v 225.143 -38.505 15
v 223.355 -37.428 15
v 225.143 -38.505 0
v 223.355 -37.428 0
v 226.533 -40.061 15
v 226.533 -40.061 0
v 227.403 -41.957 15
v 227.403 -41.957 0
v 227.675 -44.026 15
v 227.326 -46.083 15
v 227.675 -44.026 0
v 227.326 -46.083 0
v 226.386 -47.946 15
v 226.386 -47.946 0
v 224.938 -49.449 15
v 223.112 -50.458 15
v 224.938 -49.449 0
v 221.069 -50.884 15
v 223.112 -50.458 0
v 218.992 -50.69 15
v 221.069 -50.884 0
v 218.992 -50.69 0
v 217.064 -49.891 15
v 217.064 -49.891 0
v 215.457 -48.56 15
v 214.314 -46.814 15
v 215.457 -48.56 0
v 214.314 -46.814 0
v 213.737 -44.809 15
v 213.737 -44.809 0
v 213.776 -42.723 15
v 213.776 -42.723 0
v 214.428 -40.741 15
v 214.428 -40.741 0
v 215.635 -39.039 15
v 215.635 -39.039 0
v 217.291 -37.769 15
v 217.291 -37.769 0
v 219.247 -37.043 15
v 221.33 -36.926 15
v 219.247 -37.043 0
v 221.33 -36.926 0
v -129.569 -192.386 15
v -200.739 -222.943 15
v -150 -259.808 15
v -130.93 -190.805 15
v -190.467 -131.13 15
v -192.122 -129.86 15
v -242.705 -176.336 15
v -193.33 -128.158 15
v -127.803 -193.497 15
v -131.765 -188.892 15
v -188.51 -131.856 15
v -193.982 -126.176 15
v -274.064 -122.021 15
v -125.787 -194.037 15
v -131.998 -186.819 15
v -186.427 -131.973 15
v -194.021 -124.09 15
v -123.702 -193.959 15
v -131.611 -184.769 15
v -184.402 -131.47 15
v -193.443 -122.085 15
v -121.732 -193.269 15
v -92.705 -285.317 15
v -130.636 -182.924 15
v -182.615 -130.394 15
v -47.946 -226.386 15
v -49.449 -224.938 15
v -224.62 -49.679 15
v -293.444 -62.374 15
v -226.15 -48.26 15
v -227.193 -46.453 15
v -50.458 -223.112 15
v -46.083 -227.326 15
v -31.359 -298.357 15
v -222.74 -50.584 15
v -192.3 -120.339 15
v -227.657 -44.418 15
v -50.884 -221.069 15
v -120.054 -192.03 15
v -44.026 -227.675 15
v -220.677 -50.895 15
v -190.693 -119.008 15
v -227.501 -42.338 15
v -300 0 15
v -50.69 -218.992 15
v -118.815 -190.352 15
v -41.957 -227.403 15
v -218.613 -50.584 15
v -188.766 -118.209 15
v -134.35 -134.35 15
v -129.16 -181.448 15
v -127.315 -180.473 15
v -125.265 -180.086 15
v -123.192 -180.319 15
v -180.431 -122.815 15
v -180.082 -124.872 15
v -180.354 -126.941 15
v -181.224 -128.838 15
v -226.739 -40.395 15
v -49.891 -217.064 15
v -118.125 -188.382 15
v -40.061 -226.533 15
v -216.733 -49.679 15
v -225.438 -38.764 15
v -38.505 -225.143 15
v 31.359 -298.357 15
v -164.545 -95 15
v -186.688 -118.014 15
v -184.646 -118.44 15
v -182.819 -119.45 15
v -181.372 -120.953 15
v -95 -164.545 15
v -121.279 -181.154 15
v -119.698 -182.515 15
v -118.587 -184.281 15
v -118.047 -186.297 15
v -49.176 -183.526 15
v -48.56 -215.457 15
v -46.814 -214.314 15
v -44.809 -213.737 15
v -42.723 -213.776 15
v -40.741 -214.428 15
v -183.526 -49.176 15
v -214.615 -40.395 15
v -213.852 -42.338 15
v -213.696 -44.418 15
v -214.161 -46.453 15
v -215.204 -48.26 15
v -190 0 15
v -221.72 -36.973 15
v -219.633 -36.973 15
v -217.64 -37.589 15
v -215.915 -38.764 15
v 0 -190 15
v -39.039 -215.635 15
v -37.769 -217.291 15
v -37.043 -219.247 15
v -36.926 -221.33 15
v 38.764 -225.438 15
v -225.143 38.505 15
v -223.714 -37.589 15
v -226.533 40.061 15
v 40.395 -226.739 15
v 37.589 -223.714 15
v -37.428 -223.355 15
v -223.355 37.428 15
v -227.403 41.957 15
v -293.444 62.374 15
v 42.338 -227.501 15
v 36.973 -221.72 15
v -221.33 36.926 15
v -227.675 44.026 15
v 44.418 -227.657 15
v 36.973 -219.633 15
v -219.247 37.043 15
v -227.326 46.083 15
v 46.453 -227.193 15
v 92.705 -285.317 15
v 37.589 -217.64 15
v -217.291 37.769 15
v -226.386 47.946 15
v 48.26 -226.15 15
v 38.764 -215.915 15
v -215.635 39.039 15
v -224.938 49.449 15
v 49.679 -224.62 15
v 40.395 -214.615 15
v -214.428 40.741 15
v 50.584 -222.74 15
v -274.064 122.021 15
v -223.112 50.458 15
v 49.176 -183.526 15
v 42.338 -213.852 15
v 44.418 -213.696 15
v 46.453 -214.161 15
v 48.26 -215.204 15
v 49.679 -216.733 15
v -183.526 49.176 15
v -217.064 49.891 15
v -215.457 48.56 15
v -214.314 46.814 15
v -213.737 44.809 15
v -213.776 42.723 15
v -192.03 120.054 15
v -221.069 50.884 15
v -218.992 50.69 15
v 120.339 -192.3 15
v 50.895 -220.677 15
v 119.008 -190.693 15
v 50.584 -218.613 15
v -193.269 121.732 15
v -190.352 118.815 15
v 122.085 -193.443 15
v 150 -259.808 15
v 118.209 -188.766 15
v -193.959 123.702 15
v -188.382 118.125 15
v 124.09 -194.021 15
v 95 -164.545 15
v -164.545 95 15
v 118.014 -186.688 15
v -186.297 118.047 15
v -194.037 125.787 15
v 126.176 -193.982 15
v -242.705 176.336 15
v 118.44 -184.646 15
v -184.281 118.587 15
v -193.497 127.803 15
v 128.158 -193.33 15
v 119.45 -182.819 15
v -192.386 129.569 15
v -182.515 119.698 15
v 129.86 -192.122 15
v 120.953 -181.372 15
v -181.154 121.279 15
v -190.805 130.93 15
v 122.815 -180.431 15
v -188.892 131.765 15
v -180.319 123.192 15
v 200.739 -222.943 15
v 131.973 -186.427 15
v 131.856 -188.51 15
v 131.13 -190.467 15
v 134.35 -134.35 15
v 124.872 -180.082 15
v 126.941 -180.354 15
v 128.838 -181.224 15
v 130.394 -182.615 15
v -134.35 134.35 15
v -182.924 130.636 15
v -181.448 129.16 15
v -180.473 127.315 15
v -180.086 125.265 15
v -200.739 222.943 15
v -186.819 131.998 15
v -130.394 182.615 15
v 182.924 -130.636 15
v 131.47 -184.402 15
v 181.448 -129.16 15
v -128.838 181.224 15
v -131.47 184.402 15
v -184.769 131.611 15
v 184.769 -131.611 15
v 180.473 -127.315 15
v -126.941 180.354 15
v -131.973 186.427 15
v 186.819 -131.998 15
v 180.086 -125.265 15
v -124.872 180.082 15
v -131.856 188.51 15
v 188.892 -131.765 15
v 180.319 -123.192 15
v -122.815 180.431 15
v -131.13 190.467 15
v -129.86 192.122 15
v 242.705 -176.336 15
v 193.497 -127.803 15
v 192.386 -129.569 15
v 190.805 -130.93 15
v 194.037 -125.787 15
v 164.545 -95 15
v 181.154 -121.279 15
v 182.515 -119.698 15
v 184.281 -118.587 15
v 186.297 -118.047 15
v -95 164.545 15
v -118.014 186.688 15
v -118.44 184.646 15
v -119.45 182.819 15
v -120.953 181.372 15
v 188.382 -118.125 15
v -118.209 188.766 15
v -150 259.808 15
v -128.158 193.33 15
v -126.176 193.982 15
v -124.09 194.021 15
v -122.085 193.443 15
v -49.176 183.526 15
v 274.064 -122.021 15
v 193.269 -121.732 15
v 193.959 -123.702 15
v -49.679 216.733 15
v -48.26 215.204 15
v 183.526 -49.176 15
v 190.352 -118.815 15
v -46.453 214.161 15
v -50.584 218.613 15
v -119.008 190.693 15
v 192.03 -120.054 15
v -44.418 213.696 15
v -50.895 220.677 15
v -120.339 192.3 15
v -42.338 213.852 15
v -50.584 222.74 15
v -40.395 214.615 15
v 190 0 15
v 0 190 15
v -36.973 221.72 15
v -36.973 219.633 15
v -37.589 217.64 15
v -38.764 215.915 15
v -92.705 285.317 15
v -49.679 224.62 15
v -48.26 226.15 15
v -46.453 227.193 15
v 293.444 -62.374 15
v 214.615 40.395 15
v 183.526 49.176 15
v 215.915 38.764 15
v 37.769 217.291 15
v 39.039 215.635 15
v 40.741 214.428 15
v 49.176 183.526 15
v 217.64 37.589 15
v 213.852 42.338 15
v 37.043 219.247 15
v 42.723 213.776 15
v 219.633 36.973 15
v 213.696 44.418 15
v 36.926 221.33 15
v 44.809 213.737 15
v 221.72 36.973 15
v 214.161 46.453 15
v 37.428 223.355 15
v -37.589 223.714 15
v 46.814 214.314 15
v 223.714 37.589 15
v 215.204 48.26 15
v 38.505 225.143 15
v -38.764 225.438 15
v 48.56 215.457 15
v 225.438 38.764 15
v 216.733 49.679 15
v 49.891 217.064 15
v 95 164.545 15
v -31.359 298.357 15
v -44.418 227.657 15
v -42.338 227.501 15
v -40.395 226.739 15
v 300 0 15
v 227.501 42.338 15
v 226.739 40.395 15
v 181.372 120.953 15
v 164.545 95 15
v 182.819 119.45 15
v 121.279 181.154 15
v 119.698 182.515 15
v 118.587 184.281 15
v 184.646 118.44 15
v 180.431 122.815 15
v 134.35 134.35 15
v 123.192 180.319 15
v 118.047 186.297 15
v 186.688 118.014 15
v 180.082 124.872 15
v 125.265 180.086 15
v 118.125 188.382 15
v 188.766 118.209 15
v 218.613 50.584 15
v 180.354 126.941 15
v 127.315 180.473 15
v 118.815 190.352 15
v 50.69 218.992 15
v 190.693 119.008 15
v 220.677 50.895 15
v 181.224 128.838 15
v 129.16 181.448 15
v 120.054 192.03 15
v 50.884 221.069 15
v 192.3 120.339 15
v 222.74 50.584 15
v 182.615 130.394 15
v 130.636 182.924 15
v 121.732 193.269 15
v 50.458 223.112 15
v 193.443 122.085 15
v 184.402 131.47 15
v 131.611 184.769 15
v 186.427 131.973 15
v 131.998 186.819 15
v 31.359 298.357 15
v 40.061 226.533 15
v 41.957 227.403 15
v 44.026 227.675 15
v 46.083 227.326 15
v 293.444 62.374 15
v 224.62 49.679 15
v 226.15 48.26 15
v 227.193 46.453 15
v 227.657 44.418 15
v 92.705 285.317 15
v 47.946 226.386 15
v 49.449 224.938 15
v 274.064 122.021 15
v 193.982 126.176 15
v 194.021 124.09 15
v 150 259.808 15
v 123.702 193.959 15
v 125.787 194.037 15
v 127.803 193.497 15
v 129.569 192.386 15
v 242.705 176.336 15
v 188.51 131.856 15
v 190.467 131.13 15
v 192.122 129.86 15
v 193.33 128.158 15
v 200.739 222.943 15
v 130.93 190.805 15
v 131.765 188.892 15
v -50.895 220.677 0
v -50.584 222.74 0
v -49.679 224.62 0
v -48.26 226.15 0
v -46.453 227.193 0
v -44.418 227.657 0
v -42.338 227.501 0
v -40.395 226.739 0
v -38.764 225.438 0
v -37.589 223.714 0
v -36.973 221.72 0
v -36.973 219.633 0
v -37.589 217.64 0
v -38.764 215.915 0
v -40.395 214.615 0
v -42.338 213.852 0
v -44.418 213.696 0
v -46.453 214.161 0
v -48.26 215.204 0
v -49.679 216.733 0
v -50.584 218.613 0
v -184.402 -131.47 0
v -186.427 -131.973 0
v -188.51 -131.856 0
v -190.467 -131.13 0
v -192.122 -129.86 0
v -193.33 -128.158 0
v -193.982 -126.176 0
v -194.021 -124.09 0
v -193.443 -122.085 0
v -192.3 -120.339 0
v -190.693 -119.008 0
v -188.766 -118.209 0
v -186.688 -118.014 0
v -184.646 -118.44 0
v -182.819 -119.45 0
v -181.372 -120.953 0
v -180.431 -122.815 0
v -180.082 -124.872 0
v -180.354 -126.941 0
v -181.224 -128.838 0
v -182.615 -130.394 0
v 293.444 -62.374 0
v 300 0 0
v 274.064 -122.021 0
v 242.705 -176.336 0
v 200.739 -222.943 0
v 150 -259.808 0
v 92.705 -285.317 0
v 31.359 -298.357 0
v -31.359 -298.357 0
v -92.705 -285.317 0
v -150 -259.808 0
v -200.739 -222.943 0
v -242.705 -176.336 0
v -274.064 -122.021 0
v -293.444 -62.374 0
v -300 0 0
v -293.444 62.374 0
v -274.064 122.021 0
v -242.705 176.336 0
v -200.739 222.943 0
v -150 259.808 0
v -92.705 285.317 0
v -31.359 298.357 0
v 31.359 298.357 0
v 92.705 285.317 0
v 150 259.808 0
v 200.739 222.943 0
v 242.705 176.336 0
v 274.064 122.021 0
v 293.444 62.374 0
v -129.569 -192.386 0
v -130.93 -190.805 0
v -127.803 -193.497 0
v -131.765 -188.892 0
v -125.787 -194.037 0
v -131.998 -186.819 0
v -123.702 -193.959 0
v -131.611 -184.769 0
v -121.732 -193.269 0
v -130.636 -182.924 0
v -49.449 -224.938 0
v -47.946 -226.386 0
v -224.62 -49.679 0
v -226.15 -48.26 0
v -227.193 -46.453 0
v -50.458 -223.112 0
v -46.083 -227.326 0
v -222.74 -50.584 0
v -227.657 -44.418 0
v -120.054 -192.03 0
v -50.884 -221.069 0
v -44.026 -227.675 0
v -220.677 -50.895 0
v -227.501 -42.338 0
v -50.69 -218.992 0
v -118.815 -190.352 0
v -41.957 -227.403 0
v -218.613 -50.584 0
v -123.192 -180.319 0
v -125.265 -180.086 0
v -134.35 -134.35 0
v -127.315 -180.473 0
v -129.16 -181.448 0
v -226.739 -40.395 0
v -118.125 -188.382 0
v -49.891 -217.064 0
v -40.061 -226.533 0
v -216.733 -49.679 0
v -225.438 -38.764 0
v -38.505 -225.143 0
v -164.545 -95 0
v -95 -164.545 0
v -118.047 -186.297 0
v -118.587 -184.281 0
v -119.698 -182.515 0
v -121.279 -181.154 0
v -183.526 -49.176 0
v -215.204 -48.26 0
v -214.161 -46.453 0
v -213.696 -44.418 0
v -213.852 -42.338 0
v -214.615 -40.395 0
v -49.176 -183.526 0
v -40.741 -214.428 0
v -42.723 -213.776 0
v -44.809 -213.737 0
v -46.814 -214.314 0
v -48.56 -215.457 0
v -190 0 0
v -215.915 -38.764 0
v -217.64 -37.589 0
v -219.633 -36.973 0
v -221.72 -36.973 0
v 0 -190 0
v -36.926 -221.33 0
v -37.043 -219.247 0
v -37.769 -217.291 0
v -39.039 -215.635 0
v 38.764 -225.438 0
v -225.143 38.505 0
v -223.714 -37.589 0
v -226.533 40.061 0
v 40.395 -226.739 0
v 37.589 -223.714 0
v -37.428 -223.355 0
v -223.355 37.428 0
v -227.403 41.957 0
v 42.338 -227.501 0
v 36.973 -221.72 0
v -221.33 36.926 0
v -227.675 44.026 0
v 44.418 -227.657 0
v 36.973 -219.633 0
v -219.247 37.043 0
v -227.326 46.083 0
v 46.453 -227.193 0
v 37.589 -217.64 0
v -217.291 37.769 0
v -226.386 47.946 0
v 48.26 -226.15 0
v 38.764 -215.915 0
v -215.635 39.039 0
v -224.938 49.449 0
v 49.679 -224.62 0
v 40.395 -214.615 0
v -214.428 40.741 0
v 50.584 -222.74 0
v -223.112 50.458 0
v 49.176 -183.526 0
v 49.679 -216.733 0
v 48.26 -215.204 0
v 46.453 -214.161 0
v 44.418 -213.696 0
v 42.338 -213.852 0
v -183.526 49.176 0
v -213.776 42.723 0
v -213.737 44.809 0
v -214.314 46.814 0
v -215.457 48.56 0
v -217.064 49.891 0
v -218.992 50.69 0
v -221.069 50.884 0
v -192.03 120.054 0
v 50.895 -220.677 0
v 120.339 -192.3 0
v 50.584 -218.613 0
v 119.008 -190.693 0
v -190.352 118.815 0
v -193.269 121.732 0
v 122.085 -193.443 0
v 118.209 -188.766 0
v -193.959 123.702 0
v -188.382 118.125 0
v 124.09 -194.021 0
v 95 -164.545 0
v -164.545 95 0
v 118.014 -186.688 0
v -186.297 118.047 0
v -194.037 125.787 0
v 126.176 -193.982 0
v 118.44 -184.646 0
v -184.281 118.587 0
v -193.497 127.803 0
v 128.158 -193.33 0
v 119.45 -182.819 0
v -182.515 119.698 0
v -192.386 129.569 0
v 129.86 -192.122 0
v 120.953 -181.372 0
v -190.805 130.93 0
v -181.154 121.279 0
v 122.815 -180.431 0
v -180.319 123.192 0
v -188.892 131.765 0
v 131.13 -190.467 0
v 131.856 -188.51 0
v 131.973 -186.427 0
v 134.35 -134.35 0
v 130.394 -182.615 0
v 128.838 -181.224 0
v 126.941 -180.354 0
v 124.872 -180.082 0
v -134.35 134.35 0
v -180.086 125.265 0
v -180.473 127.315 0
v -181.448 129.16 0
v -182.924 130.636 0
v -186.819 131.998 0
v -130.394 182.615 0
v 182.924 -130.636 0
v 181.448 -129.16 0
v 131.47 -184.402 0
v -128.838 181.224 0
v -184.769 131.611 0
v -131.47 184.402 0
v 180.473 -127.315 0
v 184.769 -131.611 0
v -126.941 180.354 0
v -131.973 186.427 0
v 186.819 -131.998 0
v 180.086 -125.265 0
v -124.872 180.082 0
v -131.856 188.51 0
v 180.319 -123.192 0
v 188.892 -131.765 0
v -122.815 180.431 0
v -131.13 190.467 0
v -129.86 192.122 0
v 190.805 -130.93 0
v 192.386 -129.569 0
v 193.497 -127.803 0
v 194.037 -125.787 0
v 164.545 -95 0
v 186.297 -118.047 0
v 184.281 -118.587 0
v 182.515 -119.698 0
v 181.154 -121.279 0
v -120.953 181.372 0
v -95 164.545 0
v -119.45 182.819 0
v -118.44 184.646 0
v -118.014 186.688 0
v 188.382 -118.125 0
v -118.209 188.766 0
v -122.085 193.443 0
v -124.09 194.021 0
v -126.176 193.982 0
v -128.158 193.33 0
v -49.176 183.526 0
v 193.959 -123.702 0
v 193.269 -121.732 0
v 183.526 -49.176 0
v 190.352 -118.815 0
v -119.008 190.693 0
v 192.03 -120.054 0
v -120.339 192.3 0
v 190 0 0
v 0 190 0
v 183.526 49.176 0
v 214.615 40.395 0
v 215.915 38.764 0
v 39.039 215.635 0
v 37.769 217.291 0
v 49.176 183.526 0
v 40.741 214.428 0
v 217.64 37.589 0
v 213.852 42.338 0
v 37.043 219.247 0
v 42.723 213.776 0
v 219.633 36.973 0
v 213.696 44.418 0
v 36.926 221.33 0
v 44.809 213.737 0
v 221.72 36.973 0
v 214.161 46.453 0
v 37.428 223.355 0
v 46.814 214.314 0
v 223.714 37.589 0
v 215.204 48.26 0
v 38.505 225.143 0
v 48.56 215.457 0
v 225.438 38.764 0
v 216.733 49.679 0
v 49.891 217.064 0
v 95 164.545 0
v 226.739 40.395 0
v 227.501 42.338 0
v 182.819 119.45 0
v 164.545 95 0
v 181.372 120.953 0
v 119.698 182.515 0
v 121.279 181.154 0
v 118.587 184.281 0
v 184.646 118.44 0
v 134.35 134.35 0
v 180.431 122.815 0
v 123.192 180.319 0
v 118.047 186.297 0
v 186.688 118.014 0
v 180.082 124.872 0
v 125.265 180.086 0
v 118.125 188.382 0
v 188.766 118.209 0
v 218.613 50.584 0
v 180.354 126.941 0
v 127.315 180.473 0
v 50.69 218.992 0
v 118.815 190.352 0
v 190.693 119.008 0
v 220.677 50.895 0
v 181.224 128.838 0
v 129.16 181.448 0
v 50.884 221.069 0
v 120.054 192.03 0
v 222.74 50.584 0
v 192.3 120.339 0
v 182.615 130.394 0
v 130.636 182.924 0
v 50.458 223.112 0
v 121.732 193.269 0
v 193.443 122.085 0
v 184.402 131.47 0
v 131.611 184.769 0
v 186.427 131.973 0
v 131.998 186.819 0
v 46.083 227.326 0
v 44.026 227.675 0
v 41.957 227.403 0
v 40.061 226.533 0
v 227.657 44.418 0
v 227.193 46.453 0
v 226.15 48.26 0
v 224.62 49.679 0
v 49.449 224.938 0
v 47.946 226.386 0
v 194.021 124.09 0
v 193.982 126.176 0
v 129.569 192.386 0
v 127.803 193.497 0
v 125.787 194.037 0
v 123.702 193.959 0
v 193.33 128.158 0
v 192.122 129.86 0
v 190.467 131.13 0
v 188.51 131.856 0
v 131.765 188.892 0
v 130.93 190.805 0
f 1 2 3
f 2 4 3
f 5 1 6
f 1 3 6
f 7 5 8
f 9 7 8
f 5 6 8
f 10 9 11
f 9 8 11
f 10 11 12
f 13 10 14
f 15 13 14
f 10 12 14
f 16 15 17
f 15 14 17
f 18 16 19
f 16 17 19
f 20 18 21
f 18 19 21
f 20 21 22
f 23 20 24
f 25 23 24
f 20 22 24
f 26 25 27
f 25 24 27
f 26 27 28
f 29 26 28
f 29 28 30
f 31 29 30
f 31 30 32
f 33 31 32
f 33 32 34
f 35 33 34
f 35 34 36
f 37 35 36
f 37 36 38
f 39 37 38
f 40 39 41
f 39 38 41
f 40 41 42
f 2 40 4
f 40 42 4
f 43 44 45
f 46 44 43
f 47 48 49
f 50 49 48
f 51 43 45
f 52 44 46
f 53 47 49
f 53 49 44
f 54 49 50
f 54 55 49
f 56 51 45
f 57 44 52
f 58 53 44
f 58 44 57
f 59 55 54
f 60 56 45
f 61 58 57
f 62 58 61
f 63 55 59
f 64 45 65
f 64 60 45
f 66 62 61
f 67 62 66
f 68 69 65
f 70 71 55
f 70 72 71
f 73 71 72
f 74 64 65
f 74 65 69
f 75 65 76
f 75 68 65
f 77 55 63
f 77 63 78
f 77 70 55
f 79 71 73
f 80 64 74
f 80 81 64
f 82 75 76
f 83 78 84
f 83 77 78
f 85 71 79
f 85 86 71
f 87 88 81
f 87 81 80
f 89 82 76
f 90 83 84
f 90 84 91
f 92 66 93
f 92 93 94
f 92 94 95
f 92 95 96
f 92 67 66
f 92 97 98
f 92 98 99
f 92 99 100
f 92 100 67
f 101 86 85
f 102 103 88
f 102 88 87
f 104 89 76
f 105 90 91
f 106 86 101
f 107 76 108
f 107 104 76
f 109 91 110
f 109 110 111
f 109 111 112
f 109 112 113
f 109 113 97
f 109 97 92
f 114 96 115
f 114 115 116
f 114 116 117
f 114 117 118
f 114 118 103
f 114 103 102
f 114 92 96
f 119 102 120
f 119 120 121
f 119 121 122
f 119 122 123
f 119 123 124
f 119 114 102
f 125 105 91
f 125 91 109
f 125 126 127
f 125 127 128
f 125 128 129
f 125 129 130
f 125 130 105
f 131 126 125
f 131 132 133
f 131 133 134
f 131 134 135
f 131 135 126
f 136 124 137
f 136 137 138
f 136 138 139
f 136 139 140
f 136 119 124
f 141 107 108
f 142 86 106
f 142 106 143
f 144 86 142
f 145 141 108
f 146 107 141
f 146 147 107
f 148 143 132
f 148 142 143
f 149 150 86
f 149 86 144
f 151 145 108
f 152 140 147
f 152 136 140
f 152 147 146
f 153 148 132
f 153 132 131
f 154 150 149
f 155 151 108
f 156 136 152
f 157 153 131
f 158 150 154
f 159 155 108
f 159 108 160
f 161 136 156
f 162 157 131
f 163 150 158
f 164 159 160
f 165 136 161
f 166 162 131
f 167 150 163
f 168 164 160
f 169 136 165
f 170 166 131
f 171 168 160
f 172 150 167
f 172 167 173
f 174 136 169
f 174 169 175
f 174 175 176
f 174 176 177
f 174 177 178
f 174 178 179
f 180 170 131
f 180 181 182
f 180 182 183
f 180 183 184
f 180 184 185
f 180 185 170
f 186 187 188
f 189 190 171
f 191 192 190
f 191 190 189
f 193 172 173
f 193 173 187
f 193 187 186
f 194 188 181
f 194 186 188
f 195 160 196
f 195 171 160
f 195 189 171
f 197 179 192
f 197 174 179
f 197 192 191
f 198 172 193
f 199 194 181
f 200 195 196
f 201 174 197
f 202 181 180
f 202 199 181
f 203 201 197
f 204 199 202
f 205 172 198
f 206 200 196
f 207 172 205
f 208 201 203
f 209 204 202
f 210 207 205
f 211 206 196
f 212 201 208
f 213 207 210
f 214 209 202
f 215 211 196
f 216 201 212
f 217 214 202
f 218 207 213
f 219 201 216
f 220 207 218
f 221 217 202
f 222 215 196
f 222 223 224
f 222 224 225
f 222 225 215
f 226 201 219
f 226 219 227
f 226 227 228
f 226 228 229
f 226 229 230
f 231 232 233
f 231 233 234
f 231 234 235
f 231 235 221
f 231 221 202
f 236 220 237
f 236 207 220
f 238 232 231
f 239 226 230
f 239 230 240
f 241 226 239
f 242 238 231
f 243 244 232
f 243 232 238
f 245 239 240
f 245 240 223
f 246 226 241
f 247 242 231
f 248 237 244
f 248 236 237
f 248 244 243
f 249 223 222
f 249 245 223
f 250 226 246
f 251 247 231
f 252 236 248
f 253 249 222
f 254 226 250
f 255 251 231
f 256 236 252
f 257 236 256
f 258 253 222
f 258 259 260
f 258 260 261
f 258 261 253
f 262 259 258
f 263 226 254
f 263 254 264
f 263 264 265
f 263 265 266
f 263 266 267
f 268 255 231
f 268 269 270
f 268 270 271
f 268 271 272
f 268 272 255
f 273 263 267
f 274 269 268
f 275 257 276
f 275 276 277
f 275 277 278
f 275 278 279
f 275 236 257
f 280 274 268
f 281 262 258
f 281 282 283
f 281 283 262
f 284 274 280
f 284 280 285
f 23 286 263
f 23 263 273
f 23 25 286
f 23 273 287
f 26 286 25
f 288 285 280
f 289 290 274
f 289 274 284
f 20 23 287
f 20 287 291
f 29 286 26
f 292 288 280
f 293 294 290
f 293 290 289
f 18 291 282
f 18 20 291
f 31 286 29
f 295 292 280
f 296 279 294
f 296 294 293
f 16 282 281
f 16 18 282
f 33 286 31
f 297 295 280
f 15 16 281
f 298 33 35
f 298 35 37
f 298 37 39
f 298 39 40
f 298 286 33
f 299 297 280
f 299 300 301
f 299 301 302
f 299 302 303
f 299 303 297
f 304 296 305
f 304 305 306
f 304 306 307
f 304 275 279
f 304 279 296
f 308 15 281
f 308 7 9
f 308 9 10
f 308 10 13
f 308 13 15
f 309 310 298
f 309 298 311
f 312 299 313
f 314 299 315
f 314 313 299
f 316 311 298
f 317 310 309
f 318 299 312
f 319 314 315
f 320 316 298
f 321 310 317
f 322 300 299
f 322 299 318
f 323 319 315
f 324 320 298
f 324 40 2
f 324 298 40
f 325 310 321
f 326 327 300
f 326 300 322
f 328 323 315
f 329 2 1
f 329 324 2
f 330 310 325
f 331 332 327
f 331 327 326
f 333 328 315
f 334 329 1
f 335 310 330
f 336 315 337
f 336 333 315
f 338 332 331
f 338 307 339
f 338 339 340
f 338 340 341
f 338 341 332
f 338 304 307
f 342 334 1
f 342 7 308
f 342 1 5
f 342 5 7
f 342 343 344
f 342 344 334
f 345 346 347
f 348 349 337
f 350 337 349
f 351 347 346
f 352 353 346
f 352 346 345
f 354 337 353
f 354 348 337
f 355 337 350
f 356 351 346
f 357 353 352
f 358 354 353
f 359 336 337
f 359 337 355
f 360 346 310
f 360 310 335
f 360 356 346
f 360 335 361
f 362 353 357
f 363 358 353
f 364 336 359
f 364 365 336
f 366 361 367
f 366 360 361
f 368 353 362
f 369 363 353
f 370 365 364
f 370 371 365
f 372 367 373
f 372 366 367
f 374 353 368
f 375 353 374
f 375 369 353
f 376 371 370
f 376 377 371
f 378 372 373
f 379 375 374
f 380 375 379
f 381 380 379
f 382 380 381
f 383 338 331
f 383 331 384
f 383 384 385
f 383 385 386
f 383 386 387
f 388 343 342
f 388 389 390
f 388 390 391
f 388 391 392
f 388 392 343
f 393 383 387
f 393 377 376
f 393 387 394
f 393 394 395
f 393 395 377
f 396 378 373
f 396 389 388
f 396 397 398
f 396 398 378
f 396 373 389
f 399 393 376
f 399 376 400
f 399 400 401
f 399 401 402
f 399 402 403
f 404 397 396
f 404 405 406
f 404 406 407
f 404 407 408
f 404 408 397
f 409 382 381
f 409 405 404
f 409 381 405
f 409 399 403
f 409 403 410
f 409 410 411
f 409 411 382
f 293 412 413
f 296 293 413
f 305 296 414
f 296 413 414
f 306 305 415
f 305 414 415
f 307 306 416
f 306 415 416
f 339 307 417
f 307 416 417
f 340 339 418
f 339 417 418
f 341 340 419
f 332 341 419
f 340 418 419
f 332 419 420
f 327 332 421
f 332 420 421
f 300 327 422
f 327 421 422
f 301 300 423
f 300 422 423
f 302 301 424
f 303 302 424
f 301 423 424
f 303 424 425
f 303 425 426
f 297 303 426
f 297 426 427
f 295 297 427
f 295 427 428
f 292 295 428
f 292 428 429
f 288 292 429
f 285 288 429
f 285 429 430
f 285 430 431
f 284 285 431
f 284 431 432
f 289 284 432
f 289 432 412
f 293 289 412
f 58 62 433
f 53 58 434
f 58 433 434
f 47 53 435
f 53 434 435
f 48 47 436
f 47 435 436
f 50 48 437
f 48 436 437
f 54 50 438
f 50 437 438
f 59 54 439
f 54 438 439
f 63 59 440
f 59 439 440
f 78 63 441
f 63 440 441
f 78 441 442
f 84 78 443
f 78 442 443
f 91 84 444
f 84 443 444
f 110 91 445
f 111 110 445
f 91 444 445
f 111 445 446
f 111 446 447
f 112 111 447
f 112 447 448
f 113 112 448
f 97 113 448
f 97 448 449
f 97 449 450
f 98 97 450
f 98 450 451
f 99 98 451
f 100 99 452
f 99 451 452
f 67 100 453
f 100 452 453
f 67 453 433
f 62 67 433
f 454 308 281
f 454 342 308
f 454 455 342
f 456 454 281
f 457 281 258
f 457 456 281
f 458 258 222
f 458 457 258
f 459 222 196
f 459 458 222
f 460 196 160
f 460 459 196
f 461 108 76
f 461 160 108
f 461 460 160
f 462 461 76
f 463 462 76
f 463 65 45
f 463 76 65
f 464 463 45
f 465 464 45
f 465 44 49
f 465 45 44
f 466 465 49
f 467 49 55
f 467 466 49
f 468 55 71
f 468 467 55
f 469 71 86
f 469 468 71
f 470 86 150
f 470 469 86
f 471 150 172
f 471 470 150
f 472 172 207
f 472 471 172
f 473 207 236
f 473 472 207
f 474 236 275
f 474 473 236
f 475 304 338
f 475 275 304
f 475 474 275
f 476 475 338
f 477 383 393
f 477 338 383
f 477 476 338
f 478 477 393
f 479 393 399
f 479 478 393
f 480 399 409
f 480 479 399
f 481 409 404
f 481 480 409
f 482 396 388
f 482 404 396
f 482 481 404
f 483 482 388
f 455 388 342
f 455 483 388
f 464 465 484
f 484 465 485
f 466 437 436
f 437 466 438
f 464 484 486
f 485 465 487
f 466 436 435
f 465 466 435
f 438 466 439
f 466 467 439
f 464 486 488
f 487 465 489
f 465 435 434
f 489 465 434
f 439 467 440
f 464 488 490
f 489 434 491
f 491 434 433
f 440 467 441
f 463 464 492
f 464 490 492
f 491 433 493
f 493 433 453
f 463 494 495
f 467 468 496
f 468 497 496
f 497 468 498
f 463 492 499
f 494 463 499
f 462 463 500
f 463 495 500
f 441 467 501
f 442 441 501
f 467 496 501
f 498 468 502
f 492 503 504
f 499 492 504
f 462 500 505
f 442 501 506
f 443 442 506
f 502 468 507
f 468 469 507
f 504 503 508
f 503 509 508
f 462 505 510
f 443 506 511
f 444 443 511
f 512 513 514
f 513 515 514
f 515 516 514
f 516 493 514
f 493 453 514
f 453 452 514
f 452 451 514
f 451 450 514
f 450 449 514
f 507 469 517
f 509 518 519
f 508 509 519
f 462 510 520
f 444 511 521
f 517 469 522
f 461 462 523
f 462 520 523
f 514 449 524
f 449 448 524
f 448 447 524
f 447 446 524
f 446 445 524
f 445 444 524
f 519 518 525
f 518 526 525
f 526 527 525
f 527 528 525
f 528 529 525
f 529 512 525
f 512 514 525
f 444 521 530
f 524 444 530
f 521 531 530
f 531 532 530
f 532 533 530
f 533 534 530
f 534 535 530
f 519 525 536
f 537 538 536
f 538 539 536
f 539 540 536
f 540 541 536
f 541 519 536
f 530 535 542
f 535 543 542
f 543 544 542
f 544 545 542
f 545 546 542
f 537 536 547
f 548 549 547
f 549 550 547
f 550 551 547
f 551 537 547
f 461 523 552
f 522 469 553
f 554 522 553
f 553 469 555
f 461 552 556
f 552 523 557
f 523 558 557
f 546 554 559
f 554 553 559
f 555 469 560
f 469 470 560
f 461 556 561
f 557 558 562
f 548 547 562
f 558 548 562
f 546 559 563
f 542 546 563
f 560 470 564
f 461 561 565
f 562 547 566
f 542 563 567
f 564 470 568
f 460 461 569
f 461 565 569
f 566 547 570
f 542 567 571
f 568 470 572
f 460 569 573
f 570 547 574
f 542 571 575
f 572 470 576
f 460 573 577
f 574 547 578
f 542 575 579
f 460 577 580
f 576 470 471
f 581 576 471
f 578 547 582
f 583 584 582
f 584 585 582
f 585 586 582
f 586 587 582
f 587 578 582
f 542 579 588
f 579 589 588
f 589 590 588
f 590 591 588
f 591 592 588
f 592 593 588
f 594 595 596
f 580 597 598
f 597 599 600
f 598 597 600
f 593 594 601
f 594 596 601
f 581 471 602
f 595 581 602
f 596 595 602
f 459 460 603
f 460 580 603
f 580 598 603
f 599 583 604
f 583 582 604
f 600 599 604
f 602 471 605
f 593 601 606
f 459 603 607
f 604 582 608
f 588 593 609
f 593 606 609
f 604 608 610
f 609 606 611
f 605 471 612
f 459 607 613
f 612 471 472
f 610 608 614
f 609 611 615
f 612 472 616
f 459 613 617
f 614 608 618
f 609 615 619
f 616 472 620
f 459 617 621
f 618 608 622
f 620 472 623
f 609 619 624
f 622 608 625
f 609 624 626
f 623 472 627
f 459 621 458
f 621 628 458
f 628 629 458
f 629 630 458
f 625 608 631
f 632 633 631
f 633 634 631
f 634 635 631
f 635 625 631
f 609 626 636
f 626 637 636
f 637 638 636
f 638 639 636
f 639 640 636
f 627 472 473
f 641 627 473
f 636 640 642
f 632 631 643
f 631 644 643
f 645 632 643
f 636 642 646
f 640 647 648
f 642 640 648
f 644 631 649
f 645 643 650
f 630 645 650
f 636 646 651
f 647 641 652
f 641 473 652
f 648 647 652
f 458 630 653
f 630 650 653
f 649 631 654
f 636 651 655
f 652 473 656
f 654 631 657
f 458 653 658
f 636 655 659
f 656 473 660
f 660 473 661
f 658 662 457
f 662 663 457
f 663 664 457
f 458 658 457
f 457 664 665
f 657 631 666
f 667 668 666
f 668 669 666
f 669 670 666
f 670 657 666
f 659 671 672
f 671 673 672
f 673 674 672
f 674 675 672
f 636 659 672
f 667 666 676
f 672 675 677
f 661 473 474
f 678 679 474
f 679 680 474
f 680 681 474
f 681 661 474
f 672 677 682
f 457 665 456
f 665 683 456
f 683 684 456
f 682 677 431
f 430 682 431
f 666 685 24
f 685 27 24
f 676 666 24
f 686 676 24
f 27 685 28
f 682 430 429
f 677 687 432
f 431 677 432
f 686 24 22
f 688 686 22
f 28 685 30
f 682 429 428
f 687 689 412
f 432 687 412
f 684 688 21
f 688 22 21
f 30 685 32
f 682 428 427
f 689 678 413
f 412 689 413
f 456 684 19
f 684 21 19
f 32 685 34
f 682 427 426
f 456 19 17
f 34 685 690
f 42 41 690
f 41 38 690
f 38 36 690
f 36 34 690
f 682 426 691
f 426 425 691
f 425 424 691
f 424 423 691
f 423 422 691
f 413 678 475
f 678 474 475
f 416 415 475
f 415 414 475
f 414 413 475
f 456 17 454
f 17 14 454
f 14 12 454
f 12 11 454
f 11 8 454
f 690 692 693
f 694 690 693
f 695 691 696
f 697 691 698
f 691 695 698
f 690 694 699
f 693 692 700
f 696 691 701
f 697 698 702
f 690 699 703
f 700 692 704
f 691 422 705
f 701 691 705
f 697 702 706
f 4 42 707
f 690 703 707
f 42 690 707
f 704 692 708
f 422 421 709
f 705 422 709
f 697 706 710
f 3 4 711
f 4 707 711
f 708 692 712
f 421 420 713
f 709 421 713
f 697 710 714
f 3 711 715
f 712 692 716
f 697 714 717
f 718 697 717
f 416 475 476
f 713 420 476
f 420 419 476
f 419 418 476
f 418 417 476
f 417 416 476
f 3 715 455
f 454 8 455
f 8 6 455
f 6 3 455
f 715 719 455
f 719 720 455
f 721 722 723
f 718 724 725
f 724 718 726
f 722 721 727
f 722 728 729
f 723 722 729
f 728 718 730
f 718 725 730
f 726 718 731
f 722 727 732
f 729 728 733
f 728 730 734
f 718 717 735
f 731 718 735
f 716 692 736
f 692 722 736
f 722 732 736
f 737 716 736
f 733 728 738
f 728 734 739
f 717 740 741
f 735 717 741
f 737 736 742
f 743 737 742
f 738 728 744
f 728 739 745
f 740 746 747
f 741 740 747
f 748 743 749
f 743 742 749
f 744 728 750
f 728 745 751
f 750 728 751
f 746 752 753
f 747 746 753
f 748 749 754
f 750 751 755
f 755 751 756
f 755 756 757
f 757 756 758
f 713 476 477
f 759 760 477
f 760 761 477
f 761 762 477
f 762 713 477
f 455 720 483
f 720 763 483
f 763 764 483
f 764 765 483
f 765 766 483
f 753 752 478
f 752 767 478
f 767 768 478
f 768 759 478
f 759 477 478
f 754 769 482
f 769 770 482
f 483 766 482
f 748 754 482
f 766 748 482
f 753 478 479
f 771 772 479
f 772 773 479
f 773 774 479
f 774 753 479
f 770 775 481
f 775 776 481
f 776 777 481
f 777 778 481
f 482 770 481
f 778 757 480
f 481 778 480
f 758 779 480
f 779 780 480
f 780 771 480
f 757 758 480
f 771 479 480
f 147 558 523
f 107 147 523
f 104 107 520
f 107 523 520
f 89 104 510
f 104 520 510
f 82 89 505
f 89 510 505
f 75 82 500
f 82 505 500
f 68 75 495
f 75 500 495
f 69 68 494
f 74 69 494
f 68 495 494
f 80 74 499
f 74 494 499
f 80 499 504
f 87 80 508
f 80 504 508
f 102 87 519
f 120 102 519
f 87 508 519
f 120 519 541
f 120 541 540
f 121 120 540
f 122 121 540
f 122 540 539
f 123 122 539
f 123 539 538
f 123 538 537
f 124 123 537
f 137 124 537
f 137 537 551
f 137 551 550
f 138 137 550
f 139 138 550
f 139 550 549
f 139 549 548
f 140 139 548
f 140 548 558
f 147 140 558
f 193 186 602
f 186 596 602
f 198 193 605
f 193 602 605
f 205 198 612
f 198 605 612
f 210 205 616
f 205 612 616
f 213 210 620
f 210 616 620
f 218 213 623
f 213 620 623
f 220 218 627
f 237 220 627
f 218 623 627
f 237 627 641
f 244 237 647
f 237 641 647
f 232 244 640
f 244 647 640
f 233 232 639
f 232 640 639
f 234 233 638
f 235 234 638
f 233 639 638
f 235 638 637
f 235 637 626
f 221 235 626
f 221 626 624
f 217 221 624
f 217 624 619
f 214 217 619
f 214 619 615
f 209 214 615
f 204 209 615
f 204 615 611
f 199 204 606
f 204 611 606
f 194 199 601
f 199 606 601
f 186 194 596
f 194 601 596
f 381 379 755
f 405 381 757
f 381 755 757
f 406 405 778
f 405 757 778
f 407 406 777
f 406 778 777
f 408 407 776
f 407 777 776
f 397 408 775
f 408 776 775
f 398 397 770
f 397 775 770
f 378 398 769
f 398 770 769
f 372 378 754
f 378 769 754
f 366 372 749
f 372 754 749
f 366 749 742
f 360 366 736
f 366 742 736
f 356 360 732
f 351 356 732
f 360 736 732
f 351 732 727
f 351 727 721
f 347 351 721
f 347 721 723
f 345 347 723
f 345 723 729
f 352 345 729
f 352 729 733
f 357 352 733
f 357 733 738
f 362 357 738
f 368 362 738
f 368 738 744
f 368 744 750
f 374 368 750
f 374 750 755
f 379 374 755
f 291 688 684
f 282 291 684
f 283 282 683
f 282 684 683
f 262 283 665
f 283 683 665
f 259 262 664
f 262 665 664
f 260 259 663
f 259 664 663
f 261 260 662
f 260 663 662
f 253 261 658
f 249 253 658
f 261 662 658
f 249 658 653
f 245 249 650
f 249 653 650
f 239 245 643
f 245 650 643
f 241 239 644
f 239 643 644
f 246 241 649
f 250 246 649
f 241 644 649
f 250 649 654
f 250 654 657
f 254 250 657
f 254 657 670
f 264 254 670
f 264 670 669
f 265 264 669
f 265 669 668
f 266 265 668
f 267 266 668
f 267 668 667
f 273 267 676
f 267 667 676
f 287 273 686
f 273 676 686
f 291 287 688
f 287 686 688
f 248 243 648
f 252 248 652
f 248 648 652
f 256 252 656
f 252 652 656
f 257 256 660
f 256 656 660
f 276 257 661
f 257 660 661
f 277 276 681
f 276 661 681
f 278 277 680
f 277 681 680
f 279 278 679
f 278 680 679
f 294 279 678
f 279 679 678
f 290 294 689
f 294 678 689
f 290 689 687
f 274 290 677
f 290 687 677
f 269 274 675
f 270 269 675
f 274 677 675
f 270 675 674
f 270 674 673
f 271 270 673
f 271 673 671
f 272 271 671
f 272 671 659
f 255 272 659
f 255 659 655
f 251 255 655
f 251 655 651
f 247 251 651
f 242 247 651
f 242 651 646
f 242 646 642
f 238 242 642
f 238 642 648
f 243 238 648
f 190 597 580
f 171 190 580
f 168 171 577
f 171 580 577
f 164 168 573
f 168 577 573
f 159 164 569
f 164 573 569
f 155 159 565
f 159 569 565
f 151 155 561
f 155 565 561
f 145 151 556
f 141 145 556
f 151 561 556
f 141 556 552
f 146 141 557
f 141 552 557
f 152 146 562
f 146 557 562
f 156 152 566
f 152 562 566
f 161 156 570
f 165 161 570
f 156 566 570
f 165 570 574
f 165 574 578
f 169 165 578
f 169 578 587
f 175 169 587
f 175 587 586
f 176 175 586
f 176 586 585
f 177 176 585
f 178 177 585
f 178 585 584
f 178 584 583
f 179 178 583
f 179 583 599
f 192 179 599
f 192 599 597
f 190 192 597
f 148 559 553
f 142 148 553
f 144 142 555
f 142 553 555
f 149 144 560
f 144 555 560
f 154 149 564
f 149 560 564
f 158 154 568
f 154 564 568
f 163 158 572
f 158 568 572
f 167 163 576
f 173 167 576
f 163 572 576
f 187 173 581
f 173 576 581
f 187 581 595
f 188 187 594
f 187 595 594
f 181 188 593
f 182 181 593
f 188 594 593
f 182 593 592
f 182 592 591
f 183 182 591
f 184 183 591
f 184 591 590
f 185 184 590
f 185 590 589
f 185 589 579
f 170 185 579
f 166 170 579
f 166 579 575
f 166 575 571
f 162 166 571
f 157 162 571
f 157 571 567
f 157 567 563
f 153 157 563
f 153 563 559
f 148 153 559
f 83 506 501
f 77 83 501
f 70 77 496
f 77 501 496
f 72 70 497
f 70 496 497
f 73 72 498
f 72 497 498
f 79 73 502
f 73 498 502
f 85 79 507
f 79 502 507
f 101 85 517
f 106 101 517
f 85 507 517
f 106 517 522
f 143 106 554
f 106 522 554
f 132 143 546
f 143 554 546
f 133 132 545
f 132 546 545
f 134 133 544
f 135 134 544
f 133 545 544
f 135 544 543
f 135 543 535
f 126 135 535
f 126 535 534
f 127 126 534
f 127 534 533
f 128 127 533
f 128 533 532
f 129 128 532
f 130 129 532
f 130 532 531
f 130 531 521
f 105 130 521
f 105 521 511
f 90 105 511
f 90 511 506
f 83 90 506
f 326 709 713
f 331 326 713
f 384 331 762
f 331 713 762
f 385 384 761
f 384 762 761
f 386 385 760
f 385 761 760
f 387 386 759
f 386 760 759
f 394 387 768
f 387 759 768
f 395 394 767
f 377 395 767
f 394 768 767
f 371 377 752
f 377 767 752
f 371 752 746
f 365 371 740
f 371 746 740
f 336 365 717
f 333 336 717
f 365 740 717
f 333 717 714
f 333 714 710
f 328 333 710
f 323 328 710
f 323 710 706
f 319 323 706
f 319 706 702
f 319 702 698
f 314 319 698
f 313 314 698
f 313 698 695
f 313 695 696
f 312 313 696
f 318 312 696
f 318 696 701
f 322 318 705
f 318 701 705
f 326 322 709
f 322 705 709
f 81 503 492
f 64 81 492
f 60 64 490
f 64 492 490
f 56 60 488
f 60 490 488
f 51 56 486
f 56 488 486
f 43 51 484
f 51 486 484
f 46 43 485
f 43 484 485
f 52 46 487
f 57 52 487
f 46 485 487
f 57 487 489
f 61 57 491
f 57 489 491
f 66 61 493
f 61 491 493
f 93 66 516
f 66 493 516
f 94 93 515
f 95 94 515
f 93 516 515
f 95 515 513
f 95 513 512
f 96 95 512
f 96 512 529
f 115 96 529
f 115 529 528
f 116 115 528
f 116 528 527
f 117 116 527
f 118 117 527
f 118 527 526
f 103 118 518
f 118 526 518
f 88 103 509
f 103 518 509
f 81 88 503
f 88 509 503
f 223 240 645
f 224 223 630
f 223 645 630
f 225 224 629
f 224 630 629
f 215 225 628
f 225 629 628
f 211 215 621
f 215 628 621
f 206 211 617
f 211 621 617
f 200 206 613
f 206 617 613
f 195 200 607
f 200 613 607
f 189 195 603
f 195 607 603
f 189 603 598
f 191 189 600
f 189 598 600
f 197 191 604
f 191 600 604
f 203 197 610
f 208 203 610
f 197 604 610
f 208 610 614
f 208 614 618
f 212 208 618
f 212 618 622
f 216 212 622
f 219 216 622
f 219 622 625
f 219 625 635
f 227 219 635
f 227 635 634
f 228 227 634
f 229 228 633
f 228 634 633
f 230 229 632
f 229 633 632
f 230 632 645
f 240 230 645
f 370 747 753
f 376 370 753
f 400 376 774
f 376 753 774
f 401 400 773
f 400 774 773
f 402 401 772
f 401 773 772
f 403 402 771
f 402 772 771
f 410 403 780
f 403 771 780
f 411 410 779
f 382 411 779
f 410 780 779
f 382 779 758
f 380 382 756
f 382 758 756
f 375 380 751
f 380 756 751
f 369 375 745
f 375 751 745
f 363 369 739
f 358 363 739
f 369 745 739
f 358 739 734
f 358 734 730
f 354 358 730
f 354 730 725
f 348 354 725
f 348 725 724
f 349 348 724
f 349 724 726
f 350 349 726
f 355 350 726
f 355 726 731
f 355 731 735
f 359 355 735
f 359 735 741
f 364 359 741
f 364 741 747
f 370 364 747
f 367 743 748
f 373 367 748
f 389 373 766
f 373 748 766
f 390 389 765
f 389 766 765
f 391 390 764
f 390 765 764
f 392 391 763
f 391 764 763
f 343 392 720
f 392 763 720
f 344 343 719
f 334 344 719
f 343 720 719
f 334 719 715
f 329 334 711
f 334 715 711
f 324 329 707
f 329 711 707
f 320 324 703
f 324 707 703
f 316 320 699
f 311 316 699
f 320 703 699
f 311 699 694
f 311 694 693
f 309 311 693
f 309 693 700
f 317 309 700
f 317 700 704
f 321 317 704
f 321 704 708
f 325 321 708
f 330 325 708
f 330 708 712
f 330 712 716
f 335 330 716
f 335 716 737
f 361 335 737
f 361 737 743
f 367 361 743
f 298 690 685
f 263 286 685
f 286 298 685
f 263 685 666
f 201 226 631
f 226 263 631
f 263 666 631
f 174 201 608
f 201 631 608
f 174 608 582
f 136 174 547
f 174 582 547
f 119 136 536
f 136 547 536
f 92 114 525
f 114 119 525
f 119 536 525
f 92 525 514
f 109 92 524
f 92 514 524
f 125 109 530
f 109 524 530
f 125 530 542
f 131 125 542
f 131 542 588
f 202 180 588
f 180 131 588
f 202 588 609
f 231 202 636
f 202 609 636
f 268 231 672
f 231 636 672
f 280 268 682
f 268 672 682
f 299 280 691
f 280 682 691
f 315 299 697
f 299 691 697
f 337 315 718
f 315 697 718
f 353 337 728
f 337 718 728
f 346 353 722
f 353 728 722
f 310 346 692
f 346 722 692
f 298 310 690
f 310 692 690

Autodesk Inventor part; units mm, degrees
ref_plane "YZ Plane" through (0, 0, 0) normal (1, 0, 0) x (0, 1, 0)
ref_plane "XZ Plane" through (0, 0, 0) normal (0, 1, 0) x (-1, 0, 0)
ref_plane "XY Plane" through (0, 0, 0) normal (0, 0, 1) x (1, 0, 0)
sketch "Sketch1" plane through (0, 0, 0) normal (0, 0, 1) x (1, 0, 0)
  circle A0 centre (0, 0) radius 190
  circle A1 centre (0, 0) radius 300
  point P0 (0, 225)
  dimension "d41" = 600
  dimension "d42" = 380
extrude "Extrusion1" add sketch "Sketch1" along normal blind 15
sketch "Sketch3" plane through (0, 0, 0) normal (0, 0, 1) x (1, 0, 0)
  circle A0 centre (0, 0) radius 190 construction
  circle A1 centre (0, 0) radius 300 construction
  circle A2 centre (0, 0) radius 300 construction
  line L0 (0, 0) -> (0, -300) construction
  line L1 (0, 0) -> (58.5271, -294.2356) construction
  line L2 (47.602, -239.3116) -> (40.1886, -202.0418) construction
  circle A3 centre (43.8953, -220.6767) radius 7
  circle A4 centre (0, 0) radius 225 construction
  dimension "d43" = 450
  dimension "d20" = 11.25
  dimension "d21" = 14
extrude "Extrusion3" cut sketch "Sketch3" along normal through all
pattern_circular "Circular Pattern2" count 16 over 360 about axis through (0, 0, 0) along (0, 0, -1) of "Extrusion3"
equation "\"BendRadius\" = Thickness"
equation "\"BendReliefWidth\" = Thickness"
equation "\"BendReliefDepth\" = 0.5 * Thickness"
equation "\"CornerReliefSize\" = 4 * Thickness"
equation "\"MinimumRemnant\" = 2 * Thickness"
equation "\"TransitionRadius\" = BendRadius"
equation "\"JacobiRadiusSize\" = BendRadius"
equation "\"GapSize\" = Thickness"
equation "\"Thickness\" = 3"
properties part number "ДМФ 025 кольцо прижимное корма наружное v2.0"
